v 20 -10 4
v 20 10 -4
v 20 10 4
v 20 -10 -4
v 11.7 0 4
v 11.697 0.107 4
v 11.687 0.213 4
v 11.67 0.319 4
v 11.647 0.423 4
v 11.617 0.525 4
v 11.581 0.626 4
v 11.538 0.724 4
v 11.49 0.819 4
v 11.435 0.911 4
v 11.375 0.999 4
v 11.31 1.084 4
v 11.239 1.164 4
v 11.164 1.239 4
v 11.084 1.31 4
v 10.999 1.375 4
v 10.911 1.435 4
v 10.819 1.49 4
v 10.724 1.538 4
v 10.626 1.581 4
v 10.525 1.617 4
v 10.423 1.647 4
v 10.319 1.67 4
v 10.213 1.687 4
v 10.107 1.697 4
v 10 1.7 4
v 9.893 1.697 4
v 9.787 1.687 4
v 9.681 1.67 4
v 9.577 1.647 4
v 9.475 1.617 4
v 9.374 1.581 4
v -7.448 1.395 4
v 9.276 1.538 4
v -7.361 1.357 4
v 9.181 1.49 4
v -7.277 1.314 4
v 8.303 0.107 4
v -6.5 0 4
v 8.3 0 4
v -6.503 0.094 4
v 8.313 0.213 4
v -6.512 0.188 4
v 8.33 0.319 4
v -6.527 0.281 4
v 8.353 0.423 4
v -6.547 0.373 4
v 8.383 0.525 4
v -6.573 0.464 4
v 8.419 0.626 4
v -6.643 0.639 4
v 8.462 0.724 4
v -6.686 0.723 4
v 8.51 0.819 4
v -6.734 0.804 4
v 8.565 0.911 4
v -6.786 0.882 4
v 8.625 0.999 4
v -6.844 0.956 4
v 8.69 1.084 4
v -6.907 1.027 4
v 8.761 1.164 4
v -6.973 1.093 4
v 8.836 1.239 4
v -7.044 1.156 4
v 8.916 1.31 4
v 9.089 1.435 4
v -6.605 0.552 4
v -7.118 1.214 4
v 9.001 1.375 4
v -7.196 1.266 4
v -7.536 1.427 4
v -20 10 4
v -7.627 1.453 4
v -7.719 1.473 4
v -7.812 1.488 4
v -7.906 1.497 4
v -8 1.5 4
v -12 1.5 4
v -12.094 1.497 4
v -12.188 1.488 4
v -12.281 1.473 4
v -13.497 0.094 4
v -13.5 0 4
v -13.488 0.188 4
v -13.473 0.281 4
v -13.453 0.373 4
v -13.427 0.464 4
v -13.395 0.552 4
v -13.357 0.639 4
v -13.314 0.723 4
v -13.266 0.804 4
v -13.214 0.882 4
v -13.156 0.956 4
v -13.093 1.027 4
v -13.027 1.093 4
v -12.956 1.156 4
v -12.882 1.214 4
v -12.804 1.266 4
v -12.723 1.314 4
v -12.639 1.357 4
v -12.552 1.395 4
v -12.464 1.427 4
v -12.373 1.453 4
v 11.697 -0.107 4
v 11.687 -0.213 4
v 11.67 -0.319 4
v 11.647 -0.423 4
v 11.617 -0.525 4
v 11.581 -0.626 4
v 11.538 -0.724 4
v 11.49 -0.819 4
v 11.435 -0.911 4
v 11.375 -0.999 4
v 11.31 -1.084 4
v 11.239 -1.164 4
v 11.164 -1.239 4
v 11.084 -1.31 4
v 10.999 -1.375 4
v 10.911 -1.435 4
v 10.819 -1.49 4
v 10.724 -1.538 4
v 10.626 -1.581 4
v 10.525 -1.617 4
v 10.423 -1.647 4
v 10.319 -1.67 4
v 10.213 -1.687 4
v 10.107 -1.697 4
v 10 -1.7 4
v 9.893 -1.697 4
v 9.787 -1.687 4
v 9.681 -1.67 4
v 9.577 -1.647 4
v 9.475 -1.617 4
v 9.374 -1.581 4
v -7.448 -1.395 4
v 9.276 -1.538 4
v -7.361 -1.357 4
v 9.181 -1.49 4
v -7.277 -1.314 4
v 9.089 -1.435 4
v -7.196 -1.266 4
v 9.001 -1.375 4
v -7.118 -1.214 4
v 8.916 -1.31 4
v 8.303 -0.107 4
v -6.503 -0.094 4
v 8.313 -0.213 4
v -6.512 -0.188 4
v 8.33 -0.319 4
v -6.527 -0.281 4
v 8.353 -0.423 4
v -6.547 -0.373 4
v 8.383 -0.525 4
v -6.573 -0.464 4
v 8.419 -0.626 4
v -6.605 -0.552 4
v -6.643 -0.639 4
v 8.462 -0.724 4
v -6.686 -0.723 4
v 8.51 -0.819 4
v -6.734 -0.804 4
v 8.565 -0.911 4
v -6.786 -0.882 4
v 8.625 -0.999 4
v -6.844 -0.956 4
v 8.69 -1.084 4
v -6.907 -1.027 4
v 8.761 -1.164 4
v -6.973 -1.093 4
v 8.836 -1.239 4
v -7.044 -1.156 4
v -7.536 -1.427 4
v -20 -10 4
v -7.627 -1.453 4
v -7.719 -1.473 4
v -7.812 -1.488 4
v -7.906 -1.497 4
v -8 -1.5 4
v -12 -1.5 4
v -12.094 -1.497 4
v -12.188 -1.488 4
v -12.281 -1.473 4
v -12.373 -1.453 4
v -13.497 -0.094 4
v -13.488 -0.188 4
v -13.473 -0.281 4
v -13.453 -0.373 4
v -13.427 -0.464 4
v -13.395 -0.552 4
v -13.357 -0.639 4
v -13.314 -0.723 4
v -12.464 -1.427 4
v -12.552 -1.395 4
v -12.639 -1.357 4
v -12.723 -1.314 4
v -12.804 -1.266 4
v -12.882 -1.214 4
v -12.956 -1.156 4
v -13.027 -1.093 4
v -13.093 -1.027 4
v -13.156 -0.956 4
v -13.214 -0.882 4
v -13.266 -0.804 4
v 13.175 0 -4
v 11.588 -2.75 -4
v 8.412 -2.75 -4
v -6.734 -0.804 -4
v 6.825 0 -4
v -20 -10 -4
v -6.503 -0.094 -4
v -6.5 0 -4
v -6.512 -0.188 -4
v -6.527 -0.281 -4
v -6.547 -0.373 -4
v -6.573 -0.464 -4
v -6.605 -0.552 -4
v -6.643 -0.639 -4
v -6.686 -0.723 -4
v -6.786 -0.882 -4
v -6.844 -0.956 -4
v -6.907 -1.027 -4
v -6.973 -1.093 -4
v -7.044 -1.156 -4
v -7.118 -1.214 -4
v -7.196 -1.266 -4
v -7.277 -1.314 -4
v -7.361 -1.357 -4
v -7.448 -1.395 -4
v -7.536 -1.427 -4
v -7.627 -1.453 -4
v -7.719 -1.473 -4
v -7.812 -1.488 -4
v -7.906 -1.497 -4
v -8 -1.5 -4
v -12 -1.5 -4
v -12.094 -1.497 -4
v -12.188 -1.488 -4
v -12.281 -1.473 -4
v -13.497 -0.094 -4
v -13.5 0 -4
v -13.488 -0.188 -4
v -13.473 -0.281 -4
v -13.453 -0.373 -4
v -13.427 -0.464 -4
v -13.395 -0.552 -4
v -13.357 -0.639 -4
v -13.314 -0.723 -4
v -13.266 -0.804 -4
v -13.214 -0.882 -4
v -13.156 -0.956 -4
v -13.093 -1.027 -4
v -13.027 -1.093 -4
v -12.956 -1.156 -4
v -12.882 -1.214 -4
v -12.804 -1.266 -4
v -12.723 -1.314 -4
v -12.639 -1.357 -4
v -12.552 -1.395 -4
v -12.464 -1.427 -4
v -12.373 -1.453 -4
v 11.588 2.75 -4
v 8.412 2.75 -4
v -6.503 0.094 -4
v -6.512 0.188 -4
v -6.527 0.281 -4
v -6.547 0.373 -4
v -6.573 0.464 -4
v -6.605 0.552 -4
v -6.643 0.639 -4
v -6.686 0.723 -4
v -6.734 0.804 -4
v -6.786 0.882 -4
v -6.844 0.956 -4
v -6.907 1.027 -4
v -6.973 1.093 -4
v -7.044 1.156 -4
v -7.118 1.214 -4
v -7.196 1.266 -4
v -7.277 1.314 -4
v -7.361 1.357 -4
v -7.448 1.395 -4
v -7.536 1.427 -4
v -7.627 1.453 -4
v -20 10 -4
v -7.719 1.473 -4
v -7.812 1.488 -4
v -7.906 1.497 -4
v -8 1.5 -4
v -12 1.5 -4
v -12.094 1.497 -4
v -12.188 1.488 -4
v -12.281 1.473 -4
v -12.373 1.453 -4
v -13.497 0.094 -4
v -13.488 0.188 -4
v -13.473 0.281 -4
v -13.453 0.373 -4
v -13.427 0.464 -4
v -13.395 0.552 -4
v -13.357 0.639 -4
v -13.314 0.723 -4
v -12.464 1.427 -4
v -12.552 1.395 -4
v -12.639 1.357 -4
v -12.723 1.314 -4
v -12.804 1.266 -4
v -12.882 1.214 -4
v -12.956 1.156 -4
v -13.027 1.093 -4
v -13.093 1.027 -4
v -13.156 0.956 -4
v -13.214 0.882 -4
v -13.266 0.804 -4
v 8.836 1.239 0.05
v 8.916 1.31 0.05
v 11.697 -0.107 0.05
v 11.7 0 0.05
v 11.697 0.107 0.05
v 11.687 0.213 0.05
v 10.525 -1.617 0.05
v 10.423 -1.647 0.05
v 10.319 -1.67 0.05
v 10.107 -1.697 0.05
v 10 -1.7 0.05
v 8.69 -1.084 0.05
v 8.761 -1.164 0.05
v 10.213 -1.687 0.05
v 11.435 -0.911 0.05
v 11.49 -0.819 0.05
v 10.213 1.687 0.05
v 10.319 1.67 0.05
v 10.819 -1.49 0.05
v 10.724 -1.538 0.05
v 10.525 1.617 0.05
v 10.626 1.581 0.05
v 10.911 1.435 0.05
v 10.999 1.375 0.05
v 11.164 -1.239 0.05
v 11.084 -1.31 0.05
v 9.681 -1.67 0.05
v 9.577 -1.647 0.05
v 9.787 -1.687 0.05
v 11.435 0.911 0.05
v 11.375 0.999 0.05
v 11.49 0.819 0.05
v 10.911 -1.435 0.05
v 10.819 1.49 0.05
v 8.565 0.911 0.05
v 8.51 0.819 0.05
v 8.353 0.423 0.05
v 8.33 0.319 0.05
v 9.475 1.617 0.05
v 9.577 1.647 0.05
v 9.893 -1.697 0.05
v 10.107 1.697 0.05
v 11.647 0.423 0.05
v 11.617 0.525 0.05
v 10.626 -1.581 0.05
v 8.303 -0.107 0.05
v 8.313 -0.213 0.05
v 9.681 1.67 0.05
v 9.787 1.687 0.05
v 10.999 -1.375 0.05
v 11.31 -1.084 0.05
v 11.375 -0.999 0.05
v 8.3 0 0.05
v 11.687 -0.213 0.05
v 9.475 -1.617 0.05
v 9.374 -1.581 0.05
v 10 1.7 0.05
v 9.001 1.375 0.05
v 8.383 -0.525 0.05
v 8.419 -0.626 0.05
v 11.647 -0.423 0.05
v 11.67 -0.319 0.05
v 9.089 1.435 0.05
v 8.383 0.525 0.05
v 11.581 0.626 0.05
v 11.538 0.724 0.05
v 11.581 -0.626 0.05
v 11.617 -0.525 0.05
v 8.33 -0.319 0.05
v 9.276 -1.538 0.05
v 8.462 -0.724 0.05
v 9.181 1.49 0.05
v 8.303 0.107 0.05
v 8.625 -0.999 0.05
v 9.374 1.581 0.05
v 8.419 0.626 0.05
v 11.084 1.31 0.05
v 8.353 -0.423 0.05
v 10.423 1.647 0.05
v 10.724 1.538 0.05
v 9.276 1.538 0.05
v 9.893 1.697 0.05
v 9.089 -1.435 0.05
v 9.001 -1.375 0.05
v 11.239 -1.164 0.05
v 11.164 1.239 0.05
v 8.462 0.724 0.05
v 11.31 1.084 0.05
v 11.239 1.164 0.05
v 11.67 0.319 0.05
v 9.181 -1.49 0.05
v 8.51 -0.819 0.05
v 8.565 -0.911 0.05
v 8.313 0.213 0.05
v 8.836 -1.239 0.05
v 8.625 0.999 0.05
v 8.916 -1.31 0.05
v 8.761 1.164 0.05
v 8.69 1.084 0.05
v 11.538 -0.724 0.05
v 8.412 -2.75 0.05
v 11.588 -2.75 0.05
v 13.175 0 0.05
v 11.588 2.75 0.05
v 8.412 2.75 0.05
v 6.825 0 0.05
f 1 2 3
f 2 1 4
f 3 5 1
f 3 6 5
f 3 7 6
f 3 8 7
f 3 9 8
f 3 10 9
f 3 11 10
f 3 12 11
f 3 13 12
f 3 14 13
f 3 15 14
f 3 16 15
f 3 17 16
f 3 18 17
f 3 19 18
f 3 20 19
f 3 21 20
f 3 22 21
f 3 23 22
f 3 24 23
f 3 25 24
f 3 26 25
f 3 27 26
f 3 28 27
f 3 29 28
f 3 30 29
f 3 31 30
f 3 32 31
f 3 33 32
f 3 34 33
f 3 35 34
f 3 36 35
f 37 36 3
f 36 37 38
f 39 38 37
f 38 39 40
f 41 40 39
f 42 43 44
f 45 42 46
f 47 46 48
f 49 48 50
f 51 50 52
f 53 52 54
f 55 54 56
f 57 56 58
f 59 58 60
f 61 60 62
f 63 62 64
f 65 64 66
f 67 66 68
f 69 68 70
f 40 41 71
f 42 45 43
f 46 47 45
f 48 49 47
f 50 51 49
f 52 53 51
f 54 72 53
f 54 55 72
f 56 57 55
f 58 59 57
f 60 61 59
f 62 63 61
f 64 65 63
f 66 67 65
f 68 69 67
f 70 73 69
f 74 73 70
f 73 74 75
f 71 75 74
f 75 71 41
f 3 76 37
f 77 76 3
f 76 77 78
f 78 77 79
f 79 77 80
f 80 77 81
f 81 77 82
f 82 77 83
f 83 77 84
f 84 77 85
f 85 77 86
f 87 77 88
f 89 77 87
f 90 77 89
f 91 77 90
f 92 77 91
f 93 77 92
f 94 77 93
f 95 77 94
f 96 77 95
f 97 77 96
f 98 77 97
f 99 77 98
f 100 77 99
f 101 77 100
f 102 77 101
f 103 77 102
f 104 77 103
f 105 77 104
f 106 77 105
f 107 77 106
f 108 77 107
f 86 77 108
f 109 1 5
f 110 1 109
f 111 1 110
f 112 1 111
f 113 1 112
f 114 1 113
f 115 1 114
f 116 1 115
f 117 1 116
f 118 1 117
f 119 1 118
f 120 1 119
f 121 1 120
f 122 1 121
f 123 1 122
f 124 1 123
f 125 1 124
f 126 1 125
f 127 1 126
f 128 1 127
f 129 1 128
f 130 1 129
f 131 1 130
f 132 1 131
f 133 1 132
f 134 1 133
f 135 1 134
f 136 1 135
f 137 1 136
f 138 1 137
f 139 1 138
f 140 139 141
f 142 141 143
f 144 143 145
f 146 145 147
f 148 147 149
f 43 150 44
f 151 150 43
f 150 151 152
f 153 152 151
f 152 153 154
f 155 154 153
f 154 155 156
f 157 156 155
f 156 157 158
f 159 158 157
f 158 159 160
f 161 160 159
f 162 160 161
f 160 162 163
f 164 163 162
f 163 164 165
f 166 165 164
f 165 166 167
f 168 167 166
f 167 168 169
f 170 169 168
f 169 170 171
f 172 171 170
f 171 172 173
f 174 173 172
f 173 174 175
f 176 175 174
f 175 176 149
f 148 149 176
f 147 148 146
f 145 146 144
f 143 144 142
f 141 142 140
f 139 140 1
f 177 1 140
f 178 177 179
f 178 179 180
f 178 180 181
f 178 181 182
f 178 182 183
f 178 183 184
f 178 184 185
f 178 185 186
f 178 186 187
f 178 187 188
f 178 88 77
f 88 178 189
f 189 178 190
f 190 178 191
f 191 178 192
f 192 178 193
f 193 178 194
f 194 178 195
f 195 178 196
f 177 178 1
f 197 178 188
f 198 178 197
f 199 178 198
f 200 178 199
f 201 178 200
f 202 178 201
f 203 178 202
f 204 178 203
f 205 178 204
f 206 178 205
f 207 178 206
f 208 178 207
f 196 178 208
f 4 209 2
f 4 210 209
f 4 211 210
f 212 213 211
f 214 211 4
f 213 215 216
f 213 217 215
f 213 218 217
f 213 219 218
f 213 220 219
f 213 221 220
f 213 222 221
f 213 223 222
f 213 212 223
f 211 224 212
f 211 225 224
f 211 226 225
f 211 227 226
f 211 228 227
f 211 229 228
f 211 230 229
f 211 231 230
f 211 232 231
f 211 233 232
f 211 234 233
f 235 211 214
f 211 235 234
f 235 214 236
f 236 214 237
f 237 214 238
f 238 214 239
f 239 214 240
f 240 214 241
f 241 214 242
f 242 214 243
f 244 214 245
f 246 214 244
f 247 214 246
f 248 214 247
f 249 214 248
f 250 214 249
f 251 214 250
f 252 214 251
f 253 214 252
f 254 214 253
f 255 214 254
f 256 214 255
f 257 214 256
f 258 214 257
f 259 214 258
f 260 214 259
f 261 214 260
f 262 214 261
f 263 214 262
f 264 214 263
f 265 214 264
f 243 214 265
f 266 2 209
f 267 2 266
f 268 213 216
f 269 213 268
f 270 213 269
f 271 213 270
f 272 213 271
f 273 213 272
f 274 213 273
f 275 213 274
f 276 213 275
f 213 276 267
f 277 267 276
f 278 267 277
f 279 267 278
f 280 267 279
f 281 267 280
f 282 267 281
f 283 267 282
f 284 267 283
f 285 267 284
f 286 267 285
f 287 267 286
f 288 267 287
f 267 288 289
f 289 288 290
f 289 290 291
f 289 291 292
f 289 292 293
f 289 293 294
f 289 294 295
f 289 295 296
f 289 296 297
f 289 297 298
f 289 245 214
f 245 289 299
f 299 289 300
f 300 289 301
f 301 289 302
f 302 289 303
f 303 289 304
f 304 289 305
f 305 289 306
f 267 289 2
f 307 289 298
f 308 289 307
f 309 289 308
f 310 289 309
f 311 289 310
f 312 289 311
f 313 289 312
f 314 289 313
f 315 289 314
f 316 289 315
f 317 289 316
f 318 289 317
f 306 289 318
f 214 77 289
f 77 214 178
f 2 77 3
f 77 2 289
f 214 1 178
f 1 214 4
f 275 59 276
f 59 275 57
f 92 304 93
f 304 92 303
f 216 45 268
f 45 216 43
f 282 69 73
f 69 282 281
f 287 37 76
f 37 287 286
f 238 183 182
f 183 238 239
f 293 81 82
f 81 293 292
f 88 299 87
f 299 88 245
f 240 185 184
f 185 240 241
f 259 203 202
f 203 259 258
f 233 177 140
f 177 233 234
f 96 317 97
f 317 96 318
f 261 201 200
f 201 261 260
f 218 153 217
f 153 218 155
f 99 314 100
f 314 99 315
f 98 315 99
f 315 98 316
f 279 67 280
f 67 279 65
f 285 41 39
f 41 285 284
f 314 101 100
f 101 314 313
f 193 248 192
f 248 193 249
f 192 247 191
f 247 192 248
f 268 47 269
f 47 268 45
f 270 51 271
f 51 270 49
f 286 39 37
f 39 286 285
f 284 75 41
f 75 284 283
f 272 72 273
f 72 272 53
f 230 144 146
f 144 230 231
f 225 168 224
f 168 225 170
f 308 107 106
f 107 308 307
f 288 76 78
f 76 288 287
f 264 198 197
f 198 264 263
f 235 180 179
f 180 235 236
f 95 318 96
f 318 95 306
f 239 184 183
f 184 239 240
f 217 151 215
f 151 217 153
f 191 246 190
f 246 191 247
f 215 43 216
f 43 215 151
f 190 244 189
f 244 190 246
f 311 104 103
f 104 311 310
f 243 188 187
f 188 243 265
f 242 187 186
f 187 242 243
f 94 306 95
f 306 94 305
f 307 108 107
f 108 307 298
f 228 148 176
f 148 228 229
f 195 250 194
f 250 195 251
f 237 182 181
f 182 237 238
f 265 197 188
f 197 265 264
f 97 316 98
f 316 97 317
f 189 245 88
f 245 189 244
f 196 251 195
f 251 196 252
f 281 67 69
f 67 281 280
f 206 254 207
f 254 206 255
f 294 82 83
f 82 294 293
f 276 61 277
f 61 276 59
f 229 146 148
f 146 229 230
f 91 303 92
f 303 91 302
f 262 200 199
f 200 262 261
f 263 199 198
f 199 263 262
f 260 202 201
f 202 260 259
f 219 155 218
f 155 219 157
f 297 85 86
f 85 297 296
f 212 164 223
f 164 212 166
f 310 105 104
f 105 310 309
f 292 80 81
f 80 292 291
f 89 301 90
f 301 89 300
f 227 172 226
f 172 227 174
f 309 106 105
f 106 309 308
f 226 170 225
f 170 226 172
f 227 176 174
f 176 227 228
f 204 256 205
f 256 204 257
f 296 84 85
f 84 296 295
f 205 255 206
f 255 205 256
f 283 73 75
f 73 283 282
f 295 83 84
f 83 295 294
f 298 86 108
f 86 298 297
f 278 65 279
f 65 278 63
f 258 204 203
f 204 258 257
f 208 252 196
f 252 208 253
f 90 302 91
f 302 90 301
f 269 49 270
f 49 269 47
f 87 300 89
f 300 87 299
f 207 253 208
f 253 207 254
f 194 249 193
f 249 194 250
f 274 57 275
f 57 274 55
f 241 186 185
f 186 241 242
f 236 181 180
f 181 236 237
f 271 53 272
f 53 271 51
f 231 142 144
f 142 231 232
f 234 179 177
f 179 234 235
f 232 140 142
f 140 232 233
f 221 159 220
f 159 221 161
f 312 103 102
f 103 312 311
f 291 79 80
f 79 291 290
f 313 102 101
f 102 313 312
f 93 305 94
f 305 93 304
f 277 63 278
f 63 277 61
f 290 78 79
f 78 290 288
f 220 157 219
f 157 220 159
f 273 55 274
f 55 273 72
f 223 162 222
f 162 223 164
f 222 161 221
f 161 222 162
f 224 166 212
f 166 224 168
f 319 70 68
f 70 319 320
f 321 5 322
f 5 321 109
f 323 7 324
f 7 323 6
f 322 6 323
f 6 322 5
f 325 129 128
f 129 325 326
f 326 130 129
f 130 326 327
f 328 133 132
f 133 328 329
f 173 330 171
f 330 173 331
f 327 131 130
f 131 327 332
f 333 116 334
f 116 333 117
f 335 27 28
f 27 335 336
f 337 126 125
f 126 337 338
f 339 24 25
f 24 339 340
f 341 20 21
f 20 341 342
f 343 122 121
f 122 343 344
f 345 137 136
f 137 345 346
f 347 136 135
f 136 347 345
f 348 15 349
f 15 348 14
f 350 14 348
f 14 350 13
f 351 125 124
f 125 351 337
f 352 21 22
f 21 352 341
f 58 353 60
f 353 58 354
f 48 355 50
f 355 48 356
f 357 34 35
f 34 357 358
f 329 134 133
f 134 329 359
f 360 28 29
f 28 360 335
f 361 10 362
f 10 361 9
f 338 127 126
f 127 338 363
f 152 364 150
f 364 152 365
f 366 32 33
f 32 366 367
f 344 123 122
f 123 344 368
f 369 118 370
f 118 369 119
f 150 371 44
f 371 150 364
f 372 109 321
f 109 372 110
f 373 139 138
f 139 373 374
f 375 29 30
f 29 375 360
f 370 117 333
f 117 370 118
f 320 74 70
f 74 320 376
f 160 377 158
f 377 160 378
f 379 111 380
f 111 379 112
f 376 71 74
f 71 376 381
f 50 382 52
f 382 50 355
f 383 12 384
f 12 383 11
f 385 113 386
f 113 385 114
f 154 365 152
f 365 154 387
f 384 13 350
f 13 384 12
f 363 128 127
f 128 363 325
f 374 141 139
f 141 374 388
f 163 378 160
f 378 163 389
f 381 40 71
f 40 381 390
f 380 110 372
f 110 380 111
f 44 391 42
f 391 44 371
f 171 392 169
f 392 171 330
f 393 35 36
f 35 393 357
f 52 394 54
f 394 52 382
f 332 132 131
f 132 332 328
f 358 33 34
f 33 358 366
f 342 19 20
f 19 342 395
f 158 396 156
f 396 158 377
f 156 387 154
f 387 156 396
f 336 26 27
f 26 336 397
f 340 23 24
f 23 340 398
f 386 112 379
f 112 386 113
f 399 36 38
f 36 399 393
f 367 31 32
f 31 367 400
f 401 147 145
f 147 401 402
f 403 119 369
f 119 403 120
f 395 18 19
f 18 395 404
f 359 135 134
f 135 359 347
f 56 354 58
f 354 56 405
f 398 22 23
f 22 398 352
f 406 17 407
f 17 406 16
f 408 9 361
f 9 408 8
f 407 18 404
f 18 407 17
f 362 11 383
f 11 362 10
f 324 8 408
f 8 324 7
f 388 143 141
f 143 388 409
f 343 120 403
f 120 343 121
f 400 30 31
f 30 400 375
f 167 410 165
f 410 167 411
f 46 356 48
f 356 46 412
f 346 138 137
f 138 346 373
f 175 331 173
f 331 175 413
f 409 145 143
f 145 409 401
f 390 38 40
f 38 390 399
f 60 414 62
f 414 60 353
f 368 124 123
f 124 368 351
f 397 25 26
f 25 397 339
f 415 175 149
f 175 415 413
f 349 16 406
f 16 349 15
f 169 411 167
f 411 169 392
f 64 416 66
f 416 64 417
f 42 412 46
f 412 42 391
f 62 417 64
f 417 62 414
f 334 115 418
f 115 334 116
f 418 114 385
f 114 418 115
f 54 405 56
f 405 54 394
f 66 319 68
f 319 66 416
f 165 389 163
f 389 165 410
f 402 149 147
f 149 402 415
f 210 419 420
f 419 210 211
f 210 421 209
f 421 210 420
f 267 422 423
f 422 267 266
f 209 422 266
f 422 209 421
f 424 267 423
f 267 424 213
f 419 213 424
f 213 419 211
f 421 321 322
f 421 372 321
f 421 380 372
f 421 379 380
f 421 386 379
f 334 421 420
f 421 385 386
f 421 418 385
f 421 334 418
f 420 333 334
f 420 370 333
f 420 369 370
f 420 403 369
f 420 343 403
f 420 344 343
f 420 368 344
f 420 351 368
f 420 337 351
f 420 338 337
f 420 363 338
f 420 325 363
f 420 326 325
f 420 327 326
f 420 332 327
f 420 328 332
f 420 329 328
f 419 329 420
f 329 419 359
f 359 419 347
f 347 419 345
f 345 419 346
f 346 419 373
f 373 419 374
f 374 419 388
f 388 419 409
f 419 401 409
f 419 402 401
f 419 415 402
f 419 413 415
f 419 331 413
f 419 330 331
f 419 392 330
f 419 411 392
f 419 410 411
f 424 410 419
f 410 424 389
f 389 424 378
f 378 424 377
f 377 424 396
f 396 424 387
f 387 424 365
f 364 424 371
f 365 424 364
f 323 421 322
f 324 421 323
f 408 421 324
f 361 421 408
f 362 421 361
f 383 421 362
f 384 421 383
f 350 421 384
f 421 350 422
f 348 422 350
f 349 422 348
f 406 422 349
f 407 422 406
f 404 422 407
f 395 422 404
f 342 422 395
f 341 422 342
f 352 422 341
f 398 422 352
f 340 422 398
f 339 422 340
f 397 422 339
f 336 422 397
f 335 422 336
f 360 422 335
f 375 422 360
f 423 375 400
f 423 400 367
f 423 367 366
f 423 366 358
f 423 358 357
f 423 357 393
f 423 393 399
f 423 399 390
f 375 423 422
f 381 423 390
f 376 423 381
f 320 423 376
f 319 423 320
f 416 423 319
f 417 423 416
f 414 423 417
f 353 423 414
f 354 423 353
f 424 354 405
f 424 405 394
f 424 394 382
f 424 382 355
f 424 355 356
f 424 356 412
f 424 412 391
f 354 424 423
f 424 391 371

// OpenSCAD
// =========================================================================
// MODULE: FILAMENT SHRINKAGE & HARDWARE TOLERANCE TEST COUPON
// =========================================================================
$fn = 100;

// Target Dimensions (Exactly matching your File 2 Rotor parameters)
target_outer_width = 20.0;    // Standard reference block for caliper check
target_height = 8.0;          // Total height of the test strip

// Target Hardware Fits
m3_nut_flat_to_flat = 5.5;    // Target M3 hex nut width
m3_clearance_d = 3.4;        // Target smooth bolt hole pass-through
axle_pin_d = 3.0;             // Target vertical slot thickness

// --- TEST BLOCK DESIGN ---
module shrinkage_coupon() {
    difference() {
        // Base block matrix
        cube([target_outer_width * 2, target_outer_width, target_height], center = true);
        
        // Test Fit 1: Vertical Axle Pin Guide Track (Linear Slot)
        translate([-target_outer_width / 2, 0, 0])
            hull() {
                translate([-2, 0, 0]) cylinder(h = target_height + 2, d = axle_pin_d, center = true);
                translate([2, 0, 0]) cylinder(h = target_height + 2, d = axle_pin_d, center = true);
            }
            
        // Test Fit 2: Vertical M3 Screw Pass-Through Hole
        translate([target_outer_width / 2, 0, 0])
            cylinder(h = target_height + 2, d = m3_clearance_d, center = true);
            
        // Test Fit 3: Recessed Hex Nut Pocket (Underneath side)
        // Calculated using the exact internal mathematics from File 2
        translate([target_outer_width / 2, 0, -target_height / 4])
            cylinder(h = target_height / 2 + 0.1, d = m3_nut_flat_to_flat / cos(30), center = true, $fn = 6);
    }
}

// Render the test coupon flat on the build plate
shrinkage_coupon();
